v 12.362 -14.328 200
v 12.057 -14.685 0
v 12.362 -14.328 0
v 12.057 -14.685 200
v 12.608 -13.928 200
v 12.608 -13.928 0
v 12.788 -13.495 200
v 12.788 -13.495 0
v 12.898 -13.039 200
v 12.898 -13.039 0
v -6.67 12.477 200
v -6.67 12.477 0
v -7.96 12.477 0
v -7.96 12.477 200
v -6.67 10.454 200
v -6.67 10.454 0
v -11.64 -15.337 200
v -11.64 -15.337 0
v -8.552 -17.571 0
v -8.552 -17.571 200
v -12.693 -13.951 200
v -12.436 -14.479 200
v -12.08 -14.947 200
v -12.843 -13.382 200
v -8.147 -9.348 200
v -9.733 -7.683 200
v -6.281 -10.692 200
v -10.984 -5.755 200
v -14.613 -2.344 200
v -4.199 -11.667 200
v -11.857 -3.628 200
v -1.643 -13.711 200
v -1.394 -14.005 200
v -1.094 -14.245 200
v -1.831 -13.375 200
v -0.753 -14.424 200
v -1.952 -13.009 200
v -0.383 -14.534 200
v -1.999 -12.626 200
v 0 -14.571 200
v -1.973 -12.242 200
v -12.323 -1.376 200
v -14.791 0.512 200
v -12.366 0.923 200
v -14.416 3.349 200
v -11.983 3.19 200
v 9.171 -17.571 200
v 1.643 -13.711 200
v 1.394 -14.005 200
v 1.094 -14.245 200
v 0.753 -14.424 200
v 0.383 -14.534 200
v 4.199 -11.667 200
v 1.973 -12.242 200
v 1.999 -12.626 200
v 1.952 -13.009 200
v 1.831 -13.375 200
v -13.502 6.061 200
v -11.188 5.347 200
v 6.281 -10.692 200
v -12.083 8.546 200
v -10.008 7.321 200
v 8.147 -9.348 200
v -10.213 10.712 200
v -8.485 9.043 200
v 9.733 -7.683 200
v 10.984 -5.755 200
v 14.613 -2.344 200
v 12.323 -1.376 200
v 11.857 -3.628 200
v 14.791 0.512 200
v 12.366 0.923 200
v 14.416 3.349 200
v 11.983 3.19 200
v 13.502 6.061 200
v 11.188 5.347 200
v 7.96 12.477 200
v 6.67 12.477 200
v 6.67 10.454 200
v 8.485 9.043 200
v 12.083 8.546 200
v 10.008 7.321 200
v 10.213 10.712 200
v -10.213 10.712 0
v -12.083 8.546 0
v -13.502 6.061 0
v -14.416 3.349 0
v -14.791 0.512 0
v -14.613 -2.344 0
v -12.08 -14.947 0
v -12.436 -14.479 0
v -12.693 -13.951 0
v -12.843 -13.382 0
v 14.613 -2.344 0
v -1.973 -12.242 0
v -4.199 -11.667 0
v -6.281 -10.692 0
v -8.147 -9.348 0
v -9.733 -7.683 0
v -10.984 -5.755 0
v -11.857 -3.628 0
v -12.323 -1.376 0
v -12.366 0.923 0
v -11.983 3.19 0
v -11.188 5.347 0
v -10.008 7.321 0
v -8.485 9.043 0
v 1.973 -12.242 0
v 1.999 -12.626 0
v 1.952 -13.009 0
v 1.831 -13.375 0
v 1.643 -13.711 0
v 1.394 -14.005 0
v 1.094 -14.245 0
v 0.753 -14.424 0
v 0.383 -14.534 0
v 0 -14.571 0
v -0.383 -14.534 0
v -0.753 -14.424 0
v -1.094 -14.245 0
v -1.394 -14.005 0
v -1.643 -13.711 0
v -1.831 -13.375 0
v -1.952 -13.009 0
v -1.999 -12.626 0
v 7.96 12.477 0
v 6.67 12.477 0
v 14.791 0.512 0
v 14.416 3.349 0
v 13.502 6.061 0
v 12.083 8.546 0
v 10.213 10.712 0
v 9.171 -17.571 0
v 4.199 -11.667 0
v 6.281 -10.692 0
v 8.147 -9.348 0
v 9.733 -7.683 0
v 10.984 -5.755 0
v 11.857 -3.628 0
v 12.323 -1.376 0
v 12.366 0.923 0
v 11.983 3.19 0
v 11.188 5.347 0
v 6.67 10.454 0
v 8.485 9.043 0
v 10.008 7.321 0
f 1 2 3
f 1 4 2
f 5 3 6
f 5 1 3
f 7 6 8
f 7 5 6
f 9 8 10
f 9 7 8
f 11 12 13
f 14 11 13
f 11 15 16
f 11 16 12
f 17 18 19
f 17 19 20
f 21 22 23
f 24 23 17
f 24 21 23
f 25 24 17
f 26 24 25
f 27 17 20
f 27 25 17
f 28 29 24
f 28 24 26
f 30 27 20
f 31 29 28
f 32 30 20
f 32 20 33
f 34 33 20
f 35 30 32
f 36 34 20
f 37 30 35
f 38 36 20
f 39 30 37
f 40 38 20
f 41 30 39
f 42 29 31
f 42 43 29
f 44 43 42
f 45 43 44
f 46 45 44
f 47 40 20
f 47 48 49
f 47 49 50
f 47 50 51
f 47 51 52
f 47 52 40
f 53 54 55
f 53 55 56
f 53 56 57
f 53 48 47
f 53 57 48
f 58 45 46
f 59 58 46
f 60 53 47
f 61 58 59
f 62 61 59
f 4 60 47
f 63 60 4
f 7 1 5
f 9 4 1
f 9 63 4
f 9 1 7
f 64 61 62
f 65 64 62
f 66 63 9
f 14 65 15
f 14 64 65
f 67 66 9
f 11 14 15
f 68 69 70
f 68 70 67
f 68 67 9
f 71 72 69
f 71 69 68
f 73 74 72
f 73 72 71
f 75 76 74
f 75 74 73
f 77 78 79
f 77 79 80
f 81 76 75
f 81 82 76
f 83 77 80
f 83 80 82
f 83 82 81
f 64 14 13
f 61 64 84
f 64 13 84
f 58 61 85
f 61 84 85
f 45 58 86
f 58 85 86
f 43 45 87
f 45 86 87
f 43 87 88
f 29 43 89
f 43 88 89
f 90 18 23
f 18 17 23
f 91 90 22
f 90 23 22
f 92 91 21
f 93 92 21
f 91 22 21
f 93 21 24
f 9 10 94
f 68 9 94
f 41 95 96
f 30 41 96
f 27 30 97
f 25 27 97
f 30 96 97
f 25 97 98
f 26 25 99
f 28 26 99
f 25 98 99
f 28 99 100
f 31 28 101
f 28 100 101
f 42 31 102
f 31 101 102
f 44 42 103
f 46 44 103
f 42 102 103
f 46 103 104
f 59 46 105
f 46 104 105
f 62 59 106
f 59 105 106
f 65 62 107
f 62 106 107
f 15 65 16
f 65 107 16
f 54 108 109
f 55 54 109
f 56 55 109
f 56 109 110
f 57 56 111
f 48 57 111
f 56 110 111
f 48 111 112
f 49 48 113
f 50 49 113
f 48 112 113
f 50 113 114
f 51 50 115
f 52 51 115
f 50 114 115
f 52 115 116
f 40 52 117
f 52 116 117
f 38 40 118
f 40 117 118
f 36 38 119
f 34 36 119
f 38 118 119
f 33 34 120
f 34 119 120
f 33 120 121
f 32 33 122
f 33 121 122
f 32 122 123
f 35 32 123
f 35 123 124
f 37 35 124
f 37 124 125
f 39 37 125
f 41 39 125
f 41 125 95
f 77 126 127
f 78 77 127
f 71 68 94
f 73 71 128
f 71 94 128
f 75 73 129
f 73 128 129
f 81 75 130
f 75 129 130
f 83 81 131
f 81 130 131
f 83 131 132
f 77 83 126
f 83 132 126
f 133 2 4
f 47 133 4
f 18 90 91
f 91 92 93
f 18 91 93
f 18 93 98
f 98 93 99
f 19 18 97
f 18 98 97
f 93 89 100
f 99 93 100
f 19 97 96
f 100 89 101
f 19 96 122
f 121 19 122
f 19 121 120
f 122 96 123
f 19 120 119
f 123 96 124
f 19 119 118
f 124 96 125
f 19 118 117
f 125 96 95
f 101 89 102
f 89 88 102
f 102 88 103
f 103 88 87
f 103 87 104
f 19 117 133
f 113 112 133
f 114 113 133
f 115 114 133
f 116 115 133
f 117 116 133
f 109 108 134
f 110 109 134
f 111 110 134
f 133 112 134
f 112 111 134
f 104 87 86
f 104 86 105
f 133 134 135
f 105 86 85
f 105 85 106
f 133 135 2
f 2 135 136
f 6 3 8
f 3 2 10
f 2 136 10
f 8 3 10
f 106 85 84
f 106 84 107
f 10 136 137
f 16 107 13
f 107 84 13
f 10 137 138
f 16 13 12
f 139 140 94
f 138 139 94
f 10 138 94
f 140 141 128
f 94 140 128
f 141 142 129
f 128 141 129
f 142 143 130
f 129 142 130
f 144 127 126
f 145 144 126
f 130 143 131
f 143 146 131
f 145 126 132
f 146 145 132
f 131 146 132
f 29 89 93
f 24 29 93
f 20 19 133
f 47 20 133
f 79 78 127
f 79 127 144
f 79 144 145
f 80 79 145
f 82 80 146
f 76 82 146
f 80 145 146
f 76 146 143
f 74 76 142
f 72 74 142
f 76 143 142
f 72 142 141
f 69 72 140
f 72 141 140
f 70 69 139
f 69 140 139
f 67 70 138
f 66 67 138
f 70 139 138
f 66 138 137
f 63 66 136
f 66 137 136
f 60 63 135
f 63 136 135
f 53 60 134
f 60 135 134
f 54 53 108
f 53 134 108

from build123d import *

# Parameters (mm, degrees)
BOSS_EXTRU_1_DEPTH      = 200
CHANFREIN1_SIZE2        = 3.618684617
CHANFREIN1_SIZE         = 3
CHANFREIN1_EDGE_2_SIZE2 = 3
CHANFREIN1_EDGE_2_SIZE  = 3.618684617
CONG_2_R                = 3


with BuildPart() as part:
    # Esquisse1 → Boss.-Extru.1 (new body)
    with BuildSketch(Plane.XY):
        with BuildLine():
            Line((-12.171180036, -17.570882511), (12.171180036, -17.570882511))
            Line((12.171180036, -17.570882511), (14.613263907, -2.343612169))
            ThreePointArc((14.613263907, -2.343612169), (13.502002072, 6.061018071), (7.960382718, 12.476870881))
            Line((7.960382718, 12.476870881), (6.669509845, 12.476870881))
            Line((6.669509845, 12.476870881), (6.669509845, 10.453594522))
            ThreePointArc((6.669509845, 10.453594522), (12.142715388, -2.512859527), (1.972784363, -12.242063627))
            ThreePointArc((1.972784363, -12.242063627), (0, -14.570882511), (-1.972784363, -12.242063627))
            ThreePointArc((-1.972784363, -12.242063627), (-12.142715388, -2.512859527), (-6.669509845, 10.453594522))
            Line((-6.669509845, 10.453594522), (-6.669509845, 12.476870881))
            Line((-6.669509845, 12.476870881), (-7.960382718, 12.476870881))
            ThreePointArc((-7.960382718, 12.476870881), (-13.502002072, 6.061018071), (-14.613263907, -2.343612169))
            Line((-14.613263907, -2.343612169), (-12.171180036, -17.570882511))
        make_face()
    extrude(amount=BOSS_EXTRU_1_DEPTH)

    # Chanfrein1
    chanfrein1_edges = [part.edges().sort_by_distance(p)[0] for p in [
        (12.171180036, -17.570882511, 100),
    ]]
    chamfer(chanfrein1_edges, length=CHANFREIN1_SIZE, length2=CHANFREIN1_SIZE2)

    # Chanfrein1 edge 2
    chanfrein1_edge_2_edges = [part.edges().sort_by_distance(p)[0] for p in [
        (-12.171180036, -17.570882511, 100),
    ]]
    chamfer(chanfrein1_edge_2_edges, length=CHANFREIN1_EDGE_2_SIZE, length2=CHANFREIN1_EDGE_2_SIZE2)

    # Congé2
    cong_2_edges = [part.edges().sort_by_distance(p)[0] for p in [
        (12.744206611, -13.997855937, 100),
        (-12.646236557, -14.608734422, 100),
    ]]
    fillet(cong_2_edges, radius=CONG_2_R)


solid = part.part
